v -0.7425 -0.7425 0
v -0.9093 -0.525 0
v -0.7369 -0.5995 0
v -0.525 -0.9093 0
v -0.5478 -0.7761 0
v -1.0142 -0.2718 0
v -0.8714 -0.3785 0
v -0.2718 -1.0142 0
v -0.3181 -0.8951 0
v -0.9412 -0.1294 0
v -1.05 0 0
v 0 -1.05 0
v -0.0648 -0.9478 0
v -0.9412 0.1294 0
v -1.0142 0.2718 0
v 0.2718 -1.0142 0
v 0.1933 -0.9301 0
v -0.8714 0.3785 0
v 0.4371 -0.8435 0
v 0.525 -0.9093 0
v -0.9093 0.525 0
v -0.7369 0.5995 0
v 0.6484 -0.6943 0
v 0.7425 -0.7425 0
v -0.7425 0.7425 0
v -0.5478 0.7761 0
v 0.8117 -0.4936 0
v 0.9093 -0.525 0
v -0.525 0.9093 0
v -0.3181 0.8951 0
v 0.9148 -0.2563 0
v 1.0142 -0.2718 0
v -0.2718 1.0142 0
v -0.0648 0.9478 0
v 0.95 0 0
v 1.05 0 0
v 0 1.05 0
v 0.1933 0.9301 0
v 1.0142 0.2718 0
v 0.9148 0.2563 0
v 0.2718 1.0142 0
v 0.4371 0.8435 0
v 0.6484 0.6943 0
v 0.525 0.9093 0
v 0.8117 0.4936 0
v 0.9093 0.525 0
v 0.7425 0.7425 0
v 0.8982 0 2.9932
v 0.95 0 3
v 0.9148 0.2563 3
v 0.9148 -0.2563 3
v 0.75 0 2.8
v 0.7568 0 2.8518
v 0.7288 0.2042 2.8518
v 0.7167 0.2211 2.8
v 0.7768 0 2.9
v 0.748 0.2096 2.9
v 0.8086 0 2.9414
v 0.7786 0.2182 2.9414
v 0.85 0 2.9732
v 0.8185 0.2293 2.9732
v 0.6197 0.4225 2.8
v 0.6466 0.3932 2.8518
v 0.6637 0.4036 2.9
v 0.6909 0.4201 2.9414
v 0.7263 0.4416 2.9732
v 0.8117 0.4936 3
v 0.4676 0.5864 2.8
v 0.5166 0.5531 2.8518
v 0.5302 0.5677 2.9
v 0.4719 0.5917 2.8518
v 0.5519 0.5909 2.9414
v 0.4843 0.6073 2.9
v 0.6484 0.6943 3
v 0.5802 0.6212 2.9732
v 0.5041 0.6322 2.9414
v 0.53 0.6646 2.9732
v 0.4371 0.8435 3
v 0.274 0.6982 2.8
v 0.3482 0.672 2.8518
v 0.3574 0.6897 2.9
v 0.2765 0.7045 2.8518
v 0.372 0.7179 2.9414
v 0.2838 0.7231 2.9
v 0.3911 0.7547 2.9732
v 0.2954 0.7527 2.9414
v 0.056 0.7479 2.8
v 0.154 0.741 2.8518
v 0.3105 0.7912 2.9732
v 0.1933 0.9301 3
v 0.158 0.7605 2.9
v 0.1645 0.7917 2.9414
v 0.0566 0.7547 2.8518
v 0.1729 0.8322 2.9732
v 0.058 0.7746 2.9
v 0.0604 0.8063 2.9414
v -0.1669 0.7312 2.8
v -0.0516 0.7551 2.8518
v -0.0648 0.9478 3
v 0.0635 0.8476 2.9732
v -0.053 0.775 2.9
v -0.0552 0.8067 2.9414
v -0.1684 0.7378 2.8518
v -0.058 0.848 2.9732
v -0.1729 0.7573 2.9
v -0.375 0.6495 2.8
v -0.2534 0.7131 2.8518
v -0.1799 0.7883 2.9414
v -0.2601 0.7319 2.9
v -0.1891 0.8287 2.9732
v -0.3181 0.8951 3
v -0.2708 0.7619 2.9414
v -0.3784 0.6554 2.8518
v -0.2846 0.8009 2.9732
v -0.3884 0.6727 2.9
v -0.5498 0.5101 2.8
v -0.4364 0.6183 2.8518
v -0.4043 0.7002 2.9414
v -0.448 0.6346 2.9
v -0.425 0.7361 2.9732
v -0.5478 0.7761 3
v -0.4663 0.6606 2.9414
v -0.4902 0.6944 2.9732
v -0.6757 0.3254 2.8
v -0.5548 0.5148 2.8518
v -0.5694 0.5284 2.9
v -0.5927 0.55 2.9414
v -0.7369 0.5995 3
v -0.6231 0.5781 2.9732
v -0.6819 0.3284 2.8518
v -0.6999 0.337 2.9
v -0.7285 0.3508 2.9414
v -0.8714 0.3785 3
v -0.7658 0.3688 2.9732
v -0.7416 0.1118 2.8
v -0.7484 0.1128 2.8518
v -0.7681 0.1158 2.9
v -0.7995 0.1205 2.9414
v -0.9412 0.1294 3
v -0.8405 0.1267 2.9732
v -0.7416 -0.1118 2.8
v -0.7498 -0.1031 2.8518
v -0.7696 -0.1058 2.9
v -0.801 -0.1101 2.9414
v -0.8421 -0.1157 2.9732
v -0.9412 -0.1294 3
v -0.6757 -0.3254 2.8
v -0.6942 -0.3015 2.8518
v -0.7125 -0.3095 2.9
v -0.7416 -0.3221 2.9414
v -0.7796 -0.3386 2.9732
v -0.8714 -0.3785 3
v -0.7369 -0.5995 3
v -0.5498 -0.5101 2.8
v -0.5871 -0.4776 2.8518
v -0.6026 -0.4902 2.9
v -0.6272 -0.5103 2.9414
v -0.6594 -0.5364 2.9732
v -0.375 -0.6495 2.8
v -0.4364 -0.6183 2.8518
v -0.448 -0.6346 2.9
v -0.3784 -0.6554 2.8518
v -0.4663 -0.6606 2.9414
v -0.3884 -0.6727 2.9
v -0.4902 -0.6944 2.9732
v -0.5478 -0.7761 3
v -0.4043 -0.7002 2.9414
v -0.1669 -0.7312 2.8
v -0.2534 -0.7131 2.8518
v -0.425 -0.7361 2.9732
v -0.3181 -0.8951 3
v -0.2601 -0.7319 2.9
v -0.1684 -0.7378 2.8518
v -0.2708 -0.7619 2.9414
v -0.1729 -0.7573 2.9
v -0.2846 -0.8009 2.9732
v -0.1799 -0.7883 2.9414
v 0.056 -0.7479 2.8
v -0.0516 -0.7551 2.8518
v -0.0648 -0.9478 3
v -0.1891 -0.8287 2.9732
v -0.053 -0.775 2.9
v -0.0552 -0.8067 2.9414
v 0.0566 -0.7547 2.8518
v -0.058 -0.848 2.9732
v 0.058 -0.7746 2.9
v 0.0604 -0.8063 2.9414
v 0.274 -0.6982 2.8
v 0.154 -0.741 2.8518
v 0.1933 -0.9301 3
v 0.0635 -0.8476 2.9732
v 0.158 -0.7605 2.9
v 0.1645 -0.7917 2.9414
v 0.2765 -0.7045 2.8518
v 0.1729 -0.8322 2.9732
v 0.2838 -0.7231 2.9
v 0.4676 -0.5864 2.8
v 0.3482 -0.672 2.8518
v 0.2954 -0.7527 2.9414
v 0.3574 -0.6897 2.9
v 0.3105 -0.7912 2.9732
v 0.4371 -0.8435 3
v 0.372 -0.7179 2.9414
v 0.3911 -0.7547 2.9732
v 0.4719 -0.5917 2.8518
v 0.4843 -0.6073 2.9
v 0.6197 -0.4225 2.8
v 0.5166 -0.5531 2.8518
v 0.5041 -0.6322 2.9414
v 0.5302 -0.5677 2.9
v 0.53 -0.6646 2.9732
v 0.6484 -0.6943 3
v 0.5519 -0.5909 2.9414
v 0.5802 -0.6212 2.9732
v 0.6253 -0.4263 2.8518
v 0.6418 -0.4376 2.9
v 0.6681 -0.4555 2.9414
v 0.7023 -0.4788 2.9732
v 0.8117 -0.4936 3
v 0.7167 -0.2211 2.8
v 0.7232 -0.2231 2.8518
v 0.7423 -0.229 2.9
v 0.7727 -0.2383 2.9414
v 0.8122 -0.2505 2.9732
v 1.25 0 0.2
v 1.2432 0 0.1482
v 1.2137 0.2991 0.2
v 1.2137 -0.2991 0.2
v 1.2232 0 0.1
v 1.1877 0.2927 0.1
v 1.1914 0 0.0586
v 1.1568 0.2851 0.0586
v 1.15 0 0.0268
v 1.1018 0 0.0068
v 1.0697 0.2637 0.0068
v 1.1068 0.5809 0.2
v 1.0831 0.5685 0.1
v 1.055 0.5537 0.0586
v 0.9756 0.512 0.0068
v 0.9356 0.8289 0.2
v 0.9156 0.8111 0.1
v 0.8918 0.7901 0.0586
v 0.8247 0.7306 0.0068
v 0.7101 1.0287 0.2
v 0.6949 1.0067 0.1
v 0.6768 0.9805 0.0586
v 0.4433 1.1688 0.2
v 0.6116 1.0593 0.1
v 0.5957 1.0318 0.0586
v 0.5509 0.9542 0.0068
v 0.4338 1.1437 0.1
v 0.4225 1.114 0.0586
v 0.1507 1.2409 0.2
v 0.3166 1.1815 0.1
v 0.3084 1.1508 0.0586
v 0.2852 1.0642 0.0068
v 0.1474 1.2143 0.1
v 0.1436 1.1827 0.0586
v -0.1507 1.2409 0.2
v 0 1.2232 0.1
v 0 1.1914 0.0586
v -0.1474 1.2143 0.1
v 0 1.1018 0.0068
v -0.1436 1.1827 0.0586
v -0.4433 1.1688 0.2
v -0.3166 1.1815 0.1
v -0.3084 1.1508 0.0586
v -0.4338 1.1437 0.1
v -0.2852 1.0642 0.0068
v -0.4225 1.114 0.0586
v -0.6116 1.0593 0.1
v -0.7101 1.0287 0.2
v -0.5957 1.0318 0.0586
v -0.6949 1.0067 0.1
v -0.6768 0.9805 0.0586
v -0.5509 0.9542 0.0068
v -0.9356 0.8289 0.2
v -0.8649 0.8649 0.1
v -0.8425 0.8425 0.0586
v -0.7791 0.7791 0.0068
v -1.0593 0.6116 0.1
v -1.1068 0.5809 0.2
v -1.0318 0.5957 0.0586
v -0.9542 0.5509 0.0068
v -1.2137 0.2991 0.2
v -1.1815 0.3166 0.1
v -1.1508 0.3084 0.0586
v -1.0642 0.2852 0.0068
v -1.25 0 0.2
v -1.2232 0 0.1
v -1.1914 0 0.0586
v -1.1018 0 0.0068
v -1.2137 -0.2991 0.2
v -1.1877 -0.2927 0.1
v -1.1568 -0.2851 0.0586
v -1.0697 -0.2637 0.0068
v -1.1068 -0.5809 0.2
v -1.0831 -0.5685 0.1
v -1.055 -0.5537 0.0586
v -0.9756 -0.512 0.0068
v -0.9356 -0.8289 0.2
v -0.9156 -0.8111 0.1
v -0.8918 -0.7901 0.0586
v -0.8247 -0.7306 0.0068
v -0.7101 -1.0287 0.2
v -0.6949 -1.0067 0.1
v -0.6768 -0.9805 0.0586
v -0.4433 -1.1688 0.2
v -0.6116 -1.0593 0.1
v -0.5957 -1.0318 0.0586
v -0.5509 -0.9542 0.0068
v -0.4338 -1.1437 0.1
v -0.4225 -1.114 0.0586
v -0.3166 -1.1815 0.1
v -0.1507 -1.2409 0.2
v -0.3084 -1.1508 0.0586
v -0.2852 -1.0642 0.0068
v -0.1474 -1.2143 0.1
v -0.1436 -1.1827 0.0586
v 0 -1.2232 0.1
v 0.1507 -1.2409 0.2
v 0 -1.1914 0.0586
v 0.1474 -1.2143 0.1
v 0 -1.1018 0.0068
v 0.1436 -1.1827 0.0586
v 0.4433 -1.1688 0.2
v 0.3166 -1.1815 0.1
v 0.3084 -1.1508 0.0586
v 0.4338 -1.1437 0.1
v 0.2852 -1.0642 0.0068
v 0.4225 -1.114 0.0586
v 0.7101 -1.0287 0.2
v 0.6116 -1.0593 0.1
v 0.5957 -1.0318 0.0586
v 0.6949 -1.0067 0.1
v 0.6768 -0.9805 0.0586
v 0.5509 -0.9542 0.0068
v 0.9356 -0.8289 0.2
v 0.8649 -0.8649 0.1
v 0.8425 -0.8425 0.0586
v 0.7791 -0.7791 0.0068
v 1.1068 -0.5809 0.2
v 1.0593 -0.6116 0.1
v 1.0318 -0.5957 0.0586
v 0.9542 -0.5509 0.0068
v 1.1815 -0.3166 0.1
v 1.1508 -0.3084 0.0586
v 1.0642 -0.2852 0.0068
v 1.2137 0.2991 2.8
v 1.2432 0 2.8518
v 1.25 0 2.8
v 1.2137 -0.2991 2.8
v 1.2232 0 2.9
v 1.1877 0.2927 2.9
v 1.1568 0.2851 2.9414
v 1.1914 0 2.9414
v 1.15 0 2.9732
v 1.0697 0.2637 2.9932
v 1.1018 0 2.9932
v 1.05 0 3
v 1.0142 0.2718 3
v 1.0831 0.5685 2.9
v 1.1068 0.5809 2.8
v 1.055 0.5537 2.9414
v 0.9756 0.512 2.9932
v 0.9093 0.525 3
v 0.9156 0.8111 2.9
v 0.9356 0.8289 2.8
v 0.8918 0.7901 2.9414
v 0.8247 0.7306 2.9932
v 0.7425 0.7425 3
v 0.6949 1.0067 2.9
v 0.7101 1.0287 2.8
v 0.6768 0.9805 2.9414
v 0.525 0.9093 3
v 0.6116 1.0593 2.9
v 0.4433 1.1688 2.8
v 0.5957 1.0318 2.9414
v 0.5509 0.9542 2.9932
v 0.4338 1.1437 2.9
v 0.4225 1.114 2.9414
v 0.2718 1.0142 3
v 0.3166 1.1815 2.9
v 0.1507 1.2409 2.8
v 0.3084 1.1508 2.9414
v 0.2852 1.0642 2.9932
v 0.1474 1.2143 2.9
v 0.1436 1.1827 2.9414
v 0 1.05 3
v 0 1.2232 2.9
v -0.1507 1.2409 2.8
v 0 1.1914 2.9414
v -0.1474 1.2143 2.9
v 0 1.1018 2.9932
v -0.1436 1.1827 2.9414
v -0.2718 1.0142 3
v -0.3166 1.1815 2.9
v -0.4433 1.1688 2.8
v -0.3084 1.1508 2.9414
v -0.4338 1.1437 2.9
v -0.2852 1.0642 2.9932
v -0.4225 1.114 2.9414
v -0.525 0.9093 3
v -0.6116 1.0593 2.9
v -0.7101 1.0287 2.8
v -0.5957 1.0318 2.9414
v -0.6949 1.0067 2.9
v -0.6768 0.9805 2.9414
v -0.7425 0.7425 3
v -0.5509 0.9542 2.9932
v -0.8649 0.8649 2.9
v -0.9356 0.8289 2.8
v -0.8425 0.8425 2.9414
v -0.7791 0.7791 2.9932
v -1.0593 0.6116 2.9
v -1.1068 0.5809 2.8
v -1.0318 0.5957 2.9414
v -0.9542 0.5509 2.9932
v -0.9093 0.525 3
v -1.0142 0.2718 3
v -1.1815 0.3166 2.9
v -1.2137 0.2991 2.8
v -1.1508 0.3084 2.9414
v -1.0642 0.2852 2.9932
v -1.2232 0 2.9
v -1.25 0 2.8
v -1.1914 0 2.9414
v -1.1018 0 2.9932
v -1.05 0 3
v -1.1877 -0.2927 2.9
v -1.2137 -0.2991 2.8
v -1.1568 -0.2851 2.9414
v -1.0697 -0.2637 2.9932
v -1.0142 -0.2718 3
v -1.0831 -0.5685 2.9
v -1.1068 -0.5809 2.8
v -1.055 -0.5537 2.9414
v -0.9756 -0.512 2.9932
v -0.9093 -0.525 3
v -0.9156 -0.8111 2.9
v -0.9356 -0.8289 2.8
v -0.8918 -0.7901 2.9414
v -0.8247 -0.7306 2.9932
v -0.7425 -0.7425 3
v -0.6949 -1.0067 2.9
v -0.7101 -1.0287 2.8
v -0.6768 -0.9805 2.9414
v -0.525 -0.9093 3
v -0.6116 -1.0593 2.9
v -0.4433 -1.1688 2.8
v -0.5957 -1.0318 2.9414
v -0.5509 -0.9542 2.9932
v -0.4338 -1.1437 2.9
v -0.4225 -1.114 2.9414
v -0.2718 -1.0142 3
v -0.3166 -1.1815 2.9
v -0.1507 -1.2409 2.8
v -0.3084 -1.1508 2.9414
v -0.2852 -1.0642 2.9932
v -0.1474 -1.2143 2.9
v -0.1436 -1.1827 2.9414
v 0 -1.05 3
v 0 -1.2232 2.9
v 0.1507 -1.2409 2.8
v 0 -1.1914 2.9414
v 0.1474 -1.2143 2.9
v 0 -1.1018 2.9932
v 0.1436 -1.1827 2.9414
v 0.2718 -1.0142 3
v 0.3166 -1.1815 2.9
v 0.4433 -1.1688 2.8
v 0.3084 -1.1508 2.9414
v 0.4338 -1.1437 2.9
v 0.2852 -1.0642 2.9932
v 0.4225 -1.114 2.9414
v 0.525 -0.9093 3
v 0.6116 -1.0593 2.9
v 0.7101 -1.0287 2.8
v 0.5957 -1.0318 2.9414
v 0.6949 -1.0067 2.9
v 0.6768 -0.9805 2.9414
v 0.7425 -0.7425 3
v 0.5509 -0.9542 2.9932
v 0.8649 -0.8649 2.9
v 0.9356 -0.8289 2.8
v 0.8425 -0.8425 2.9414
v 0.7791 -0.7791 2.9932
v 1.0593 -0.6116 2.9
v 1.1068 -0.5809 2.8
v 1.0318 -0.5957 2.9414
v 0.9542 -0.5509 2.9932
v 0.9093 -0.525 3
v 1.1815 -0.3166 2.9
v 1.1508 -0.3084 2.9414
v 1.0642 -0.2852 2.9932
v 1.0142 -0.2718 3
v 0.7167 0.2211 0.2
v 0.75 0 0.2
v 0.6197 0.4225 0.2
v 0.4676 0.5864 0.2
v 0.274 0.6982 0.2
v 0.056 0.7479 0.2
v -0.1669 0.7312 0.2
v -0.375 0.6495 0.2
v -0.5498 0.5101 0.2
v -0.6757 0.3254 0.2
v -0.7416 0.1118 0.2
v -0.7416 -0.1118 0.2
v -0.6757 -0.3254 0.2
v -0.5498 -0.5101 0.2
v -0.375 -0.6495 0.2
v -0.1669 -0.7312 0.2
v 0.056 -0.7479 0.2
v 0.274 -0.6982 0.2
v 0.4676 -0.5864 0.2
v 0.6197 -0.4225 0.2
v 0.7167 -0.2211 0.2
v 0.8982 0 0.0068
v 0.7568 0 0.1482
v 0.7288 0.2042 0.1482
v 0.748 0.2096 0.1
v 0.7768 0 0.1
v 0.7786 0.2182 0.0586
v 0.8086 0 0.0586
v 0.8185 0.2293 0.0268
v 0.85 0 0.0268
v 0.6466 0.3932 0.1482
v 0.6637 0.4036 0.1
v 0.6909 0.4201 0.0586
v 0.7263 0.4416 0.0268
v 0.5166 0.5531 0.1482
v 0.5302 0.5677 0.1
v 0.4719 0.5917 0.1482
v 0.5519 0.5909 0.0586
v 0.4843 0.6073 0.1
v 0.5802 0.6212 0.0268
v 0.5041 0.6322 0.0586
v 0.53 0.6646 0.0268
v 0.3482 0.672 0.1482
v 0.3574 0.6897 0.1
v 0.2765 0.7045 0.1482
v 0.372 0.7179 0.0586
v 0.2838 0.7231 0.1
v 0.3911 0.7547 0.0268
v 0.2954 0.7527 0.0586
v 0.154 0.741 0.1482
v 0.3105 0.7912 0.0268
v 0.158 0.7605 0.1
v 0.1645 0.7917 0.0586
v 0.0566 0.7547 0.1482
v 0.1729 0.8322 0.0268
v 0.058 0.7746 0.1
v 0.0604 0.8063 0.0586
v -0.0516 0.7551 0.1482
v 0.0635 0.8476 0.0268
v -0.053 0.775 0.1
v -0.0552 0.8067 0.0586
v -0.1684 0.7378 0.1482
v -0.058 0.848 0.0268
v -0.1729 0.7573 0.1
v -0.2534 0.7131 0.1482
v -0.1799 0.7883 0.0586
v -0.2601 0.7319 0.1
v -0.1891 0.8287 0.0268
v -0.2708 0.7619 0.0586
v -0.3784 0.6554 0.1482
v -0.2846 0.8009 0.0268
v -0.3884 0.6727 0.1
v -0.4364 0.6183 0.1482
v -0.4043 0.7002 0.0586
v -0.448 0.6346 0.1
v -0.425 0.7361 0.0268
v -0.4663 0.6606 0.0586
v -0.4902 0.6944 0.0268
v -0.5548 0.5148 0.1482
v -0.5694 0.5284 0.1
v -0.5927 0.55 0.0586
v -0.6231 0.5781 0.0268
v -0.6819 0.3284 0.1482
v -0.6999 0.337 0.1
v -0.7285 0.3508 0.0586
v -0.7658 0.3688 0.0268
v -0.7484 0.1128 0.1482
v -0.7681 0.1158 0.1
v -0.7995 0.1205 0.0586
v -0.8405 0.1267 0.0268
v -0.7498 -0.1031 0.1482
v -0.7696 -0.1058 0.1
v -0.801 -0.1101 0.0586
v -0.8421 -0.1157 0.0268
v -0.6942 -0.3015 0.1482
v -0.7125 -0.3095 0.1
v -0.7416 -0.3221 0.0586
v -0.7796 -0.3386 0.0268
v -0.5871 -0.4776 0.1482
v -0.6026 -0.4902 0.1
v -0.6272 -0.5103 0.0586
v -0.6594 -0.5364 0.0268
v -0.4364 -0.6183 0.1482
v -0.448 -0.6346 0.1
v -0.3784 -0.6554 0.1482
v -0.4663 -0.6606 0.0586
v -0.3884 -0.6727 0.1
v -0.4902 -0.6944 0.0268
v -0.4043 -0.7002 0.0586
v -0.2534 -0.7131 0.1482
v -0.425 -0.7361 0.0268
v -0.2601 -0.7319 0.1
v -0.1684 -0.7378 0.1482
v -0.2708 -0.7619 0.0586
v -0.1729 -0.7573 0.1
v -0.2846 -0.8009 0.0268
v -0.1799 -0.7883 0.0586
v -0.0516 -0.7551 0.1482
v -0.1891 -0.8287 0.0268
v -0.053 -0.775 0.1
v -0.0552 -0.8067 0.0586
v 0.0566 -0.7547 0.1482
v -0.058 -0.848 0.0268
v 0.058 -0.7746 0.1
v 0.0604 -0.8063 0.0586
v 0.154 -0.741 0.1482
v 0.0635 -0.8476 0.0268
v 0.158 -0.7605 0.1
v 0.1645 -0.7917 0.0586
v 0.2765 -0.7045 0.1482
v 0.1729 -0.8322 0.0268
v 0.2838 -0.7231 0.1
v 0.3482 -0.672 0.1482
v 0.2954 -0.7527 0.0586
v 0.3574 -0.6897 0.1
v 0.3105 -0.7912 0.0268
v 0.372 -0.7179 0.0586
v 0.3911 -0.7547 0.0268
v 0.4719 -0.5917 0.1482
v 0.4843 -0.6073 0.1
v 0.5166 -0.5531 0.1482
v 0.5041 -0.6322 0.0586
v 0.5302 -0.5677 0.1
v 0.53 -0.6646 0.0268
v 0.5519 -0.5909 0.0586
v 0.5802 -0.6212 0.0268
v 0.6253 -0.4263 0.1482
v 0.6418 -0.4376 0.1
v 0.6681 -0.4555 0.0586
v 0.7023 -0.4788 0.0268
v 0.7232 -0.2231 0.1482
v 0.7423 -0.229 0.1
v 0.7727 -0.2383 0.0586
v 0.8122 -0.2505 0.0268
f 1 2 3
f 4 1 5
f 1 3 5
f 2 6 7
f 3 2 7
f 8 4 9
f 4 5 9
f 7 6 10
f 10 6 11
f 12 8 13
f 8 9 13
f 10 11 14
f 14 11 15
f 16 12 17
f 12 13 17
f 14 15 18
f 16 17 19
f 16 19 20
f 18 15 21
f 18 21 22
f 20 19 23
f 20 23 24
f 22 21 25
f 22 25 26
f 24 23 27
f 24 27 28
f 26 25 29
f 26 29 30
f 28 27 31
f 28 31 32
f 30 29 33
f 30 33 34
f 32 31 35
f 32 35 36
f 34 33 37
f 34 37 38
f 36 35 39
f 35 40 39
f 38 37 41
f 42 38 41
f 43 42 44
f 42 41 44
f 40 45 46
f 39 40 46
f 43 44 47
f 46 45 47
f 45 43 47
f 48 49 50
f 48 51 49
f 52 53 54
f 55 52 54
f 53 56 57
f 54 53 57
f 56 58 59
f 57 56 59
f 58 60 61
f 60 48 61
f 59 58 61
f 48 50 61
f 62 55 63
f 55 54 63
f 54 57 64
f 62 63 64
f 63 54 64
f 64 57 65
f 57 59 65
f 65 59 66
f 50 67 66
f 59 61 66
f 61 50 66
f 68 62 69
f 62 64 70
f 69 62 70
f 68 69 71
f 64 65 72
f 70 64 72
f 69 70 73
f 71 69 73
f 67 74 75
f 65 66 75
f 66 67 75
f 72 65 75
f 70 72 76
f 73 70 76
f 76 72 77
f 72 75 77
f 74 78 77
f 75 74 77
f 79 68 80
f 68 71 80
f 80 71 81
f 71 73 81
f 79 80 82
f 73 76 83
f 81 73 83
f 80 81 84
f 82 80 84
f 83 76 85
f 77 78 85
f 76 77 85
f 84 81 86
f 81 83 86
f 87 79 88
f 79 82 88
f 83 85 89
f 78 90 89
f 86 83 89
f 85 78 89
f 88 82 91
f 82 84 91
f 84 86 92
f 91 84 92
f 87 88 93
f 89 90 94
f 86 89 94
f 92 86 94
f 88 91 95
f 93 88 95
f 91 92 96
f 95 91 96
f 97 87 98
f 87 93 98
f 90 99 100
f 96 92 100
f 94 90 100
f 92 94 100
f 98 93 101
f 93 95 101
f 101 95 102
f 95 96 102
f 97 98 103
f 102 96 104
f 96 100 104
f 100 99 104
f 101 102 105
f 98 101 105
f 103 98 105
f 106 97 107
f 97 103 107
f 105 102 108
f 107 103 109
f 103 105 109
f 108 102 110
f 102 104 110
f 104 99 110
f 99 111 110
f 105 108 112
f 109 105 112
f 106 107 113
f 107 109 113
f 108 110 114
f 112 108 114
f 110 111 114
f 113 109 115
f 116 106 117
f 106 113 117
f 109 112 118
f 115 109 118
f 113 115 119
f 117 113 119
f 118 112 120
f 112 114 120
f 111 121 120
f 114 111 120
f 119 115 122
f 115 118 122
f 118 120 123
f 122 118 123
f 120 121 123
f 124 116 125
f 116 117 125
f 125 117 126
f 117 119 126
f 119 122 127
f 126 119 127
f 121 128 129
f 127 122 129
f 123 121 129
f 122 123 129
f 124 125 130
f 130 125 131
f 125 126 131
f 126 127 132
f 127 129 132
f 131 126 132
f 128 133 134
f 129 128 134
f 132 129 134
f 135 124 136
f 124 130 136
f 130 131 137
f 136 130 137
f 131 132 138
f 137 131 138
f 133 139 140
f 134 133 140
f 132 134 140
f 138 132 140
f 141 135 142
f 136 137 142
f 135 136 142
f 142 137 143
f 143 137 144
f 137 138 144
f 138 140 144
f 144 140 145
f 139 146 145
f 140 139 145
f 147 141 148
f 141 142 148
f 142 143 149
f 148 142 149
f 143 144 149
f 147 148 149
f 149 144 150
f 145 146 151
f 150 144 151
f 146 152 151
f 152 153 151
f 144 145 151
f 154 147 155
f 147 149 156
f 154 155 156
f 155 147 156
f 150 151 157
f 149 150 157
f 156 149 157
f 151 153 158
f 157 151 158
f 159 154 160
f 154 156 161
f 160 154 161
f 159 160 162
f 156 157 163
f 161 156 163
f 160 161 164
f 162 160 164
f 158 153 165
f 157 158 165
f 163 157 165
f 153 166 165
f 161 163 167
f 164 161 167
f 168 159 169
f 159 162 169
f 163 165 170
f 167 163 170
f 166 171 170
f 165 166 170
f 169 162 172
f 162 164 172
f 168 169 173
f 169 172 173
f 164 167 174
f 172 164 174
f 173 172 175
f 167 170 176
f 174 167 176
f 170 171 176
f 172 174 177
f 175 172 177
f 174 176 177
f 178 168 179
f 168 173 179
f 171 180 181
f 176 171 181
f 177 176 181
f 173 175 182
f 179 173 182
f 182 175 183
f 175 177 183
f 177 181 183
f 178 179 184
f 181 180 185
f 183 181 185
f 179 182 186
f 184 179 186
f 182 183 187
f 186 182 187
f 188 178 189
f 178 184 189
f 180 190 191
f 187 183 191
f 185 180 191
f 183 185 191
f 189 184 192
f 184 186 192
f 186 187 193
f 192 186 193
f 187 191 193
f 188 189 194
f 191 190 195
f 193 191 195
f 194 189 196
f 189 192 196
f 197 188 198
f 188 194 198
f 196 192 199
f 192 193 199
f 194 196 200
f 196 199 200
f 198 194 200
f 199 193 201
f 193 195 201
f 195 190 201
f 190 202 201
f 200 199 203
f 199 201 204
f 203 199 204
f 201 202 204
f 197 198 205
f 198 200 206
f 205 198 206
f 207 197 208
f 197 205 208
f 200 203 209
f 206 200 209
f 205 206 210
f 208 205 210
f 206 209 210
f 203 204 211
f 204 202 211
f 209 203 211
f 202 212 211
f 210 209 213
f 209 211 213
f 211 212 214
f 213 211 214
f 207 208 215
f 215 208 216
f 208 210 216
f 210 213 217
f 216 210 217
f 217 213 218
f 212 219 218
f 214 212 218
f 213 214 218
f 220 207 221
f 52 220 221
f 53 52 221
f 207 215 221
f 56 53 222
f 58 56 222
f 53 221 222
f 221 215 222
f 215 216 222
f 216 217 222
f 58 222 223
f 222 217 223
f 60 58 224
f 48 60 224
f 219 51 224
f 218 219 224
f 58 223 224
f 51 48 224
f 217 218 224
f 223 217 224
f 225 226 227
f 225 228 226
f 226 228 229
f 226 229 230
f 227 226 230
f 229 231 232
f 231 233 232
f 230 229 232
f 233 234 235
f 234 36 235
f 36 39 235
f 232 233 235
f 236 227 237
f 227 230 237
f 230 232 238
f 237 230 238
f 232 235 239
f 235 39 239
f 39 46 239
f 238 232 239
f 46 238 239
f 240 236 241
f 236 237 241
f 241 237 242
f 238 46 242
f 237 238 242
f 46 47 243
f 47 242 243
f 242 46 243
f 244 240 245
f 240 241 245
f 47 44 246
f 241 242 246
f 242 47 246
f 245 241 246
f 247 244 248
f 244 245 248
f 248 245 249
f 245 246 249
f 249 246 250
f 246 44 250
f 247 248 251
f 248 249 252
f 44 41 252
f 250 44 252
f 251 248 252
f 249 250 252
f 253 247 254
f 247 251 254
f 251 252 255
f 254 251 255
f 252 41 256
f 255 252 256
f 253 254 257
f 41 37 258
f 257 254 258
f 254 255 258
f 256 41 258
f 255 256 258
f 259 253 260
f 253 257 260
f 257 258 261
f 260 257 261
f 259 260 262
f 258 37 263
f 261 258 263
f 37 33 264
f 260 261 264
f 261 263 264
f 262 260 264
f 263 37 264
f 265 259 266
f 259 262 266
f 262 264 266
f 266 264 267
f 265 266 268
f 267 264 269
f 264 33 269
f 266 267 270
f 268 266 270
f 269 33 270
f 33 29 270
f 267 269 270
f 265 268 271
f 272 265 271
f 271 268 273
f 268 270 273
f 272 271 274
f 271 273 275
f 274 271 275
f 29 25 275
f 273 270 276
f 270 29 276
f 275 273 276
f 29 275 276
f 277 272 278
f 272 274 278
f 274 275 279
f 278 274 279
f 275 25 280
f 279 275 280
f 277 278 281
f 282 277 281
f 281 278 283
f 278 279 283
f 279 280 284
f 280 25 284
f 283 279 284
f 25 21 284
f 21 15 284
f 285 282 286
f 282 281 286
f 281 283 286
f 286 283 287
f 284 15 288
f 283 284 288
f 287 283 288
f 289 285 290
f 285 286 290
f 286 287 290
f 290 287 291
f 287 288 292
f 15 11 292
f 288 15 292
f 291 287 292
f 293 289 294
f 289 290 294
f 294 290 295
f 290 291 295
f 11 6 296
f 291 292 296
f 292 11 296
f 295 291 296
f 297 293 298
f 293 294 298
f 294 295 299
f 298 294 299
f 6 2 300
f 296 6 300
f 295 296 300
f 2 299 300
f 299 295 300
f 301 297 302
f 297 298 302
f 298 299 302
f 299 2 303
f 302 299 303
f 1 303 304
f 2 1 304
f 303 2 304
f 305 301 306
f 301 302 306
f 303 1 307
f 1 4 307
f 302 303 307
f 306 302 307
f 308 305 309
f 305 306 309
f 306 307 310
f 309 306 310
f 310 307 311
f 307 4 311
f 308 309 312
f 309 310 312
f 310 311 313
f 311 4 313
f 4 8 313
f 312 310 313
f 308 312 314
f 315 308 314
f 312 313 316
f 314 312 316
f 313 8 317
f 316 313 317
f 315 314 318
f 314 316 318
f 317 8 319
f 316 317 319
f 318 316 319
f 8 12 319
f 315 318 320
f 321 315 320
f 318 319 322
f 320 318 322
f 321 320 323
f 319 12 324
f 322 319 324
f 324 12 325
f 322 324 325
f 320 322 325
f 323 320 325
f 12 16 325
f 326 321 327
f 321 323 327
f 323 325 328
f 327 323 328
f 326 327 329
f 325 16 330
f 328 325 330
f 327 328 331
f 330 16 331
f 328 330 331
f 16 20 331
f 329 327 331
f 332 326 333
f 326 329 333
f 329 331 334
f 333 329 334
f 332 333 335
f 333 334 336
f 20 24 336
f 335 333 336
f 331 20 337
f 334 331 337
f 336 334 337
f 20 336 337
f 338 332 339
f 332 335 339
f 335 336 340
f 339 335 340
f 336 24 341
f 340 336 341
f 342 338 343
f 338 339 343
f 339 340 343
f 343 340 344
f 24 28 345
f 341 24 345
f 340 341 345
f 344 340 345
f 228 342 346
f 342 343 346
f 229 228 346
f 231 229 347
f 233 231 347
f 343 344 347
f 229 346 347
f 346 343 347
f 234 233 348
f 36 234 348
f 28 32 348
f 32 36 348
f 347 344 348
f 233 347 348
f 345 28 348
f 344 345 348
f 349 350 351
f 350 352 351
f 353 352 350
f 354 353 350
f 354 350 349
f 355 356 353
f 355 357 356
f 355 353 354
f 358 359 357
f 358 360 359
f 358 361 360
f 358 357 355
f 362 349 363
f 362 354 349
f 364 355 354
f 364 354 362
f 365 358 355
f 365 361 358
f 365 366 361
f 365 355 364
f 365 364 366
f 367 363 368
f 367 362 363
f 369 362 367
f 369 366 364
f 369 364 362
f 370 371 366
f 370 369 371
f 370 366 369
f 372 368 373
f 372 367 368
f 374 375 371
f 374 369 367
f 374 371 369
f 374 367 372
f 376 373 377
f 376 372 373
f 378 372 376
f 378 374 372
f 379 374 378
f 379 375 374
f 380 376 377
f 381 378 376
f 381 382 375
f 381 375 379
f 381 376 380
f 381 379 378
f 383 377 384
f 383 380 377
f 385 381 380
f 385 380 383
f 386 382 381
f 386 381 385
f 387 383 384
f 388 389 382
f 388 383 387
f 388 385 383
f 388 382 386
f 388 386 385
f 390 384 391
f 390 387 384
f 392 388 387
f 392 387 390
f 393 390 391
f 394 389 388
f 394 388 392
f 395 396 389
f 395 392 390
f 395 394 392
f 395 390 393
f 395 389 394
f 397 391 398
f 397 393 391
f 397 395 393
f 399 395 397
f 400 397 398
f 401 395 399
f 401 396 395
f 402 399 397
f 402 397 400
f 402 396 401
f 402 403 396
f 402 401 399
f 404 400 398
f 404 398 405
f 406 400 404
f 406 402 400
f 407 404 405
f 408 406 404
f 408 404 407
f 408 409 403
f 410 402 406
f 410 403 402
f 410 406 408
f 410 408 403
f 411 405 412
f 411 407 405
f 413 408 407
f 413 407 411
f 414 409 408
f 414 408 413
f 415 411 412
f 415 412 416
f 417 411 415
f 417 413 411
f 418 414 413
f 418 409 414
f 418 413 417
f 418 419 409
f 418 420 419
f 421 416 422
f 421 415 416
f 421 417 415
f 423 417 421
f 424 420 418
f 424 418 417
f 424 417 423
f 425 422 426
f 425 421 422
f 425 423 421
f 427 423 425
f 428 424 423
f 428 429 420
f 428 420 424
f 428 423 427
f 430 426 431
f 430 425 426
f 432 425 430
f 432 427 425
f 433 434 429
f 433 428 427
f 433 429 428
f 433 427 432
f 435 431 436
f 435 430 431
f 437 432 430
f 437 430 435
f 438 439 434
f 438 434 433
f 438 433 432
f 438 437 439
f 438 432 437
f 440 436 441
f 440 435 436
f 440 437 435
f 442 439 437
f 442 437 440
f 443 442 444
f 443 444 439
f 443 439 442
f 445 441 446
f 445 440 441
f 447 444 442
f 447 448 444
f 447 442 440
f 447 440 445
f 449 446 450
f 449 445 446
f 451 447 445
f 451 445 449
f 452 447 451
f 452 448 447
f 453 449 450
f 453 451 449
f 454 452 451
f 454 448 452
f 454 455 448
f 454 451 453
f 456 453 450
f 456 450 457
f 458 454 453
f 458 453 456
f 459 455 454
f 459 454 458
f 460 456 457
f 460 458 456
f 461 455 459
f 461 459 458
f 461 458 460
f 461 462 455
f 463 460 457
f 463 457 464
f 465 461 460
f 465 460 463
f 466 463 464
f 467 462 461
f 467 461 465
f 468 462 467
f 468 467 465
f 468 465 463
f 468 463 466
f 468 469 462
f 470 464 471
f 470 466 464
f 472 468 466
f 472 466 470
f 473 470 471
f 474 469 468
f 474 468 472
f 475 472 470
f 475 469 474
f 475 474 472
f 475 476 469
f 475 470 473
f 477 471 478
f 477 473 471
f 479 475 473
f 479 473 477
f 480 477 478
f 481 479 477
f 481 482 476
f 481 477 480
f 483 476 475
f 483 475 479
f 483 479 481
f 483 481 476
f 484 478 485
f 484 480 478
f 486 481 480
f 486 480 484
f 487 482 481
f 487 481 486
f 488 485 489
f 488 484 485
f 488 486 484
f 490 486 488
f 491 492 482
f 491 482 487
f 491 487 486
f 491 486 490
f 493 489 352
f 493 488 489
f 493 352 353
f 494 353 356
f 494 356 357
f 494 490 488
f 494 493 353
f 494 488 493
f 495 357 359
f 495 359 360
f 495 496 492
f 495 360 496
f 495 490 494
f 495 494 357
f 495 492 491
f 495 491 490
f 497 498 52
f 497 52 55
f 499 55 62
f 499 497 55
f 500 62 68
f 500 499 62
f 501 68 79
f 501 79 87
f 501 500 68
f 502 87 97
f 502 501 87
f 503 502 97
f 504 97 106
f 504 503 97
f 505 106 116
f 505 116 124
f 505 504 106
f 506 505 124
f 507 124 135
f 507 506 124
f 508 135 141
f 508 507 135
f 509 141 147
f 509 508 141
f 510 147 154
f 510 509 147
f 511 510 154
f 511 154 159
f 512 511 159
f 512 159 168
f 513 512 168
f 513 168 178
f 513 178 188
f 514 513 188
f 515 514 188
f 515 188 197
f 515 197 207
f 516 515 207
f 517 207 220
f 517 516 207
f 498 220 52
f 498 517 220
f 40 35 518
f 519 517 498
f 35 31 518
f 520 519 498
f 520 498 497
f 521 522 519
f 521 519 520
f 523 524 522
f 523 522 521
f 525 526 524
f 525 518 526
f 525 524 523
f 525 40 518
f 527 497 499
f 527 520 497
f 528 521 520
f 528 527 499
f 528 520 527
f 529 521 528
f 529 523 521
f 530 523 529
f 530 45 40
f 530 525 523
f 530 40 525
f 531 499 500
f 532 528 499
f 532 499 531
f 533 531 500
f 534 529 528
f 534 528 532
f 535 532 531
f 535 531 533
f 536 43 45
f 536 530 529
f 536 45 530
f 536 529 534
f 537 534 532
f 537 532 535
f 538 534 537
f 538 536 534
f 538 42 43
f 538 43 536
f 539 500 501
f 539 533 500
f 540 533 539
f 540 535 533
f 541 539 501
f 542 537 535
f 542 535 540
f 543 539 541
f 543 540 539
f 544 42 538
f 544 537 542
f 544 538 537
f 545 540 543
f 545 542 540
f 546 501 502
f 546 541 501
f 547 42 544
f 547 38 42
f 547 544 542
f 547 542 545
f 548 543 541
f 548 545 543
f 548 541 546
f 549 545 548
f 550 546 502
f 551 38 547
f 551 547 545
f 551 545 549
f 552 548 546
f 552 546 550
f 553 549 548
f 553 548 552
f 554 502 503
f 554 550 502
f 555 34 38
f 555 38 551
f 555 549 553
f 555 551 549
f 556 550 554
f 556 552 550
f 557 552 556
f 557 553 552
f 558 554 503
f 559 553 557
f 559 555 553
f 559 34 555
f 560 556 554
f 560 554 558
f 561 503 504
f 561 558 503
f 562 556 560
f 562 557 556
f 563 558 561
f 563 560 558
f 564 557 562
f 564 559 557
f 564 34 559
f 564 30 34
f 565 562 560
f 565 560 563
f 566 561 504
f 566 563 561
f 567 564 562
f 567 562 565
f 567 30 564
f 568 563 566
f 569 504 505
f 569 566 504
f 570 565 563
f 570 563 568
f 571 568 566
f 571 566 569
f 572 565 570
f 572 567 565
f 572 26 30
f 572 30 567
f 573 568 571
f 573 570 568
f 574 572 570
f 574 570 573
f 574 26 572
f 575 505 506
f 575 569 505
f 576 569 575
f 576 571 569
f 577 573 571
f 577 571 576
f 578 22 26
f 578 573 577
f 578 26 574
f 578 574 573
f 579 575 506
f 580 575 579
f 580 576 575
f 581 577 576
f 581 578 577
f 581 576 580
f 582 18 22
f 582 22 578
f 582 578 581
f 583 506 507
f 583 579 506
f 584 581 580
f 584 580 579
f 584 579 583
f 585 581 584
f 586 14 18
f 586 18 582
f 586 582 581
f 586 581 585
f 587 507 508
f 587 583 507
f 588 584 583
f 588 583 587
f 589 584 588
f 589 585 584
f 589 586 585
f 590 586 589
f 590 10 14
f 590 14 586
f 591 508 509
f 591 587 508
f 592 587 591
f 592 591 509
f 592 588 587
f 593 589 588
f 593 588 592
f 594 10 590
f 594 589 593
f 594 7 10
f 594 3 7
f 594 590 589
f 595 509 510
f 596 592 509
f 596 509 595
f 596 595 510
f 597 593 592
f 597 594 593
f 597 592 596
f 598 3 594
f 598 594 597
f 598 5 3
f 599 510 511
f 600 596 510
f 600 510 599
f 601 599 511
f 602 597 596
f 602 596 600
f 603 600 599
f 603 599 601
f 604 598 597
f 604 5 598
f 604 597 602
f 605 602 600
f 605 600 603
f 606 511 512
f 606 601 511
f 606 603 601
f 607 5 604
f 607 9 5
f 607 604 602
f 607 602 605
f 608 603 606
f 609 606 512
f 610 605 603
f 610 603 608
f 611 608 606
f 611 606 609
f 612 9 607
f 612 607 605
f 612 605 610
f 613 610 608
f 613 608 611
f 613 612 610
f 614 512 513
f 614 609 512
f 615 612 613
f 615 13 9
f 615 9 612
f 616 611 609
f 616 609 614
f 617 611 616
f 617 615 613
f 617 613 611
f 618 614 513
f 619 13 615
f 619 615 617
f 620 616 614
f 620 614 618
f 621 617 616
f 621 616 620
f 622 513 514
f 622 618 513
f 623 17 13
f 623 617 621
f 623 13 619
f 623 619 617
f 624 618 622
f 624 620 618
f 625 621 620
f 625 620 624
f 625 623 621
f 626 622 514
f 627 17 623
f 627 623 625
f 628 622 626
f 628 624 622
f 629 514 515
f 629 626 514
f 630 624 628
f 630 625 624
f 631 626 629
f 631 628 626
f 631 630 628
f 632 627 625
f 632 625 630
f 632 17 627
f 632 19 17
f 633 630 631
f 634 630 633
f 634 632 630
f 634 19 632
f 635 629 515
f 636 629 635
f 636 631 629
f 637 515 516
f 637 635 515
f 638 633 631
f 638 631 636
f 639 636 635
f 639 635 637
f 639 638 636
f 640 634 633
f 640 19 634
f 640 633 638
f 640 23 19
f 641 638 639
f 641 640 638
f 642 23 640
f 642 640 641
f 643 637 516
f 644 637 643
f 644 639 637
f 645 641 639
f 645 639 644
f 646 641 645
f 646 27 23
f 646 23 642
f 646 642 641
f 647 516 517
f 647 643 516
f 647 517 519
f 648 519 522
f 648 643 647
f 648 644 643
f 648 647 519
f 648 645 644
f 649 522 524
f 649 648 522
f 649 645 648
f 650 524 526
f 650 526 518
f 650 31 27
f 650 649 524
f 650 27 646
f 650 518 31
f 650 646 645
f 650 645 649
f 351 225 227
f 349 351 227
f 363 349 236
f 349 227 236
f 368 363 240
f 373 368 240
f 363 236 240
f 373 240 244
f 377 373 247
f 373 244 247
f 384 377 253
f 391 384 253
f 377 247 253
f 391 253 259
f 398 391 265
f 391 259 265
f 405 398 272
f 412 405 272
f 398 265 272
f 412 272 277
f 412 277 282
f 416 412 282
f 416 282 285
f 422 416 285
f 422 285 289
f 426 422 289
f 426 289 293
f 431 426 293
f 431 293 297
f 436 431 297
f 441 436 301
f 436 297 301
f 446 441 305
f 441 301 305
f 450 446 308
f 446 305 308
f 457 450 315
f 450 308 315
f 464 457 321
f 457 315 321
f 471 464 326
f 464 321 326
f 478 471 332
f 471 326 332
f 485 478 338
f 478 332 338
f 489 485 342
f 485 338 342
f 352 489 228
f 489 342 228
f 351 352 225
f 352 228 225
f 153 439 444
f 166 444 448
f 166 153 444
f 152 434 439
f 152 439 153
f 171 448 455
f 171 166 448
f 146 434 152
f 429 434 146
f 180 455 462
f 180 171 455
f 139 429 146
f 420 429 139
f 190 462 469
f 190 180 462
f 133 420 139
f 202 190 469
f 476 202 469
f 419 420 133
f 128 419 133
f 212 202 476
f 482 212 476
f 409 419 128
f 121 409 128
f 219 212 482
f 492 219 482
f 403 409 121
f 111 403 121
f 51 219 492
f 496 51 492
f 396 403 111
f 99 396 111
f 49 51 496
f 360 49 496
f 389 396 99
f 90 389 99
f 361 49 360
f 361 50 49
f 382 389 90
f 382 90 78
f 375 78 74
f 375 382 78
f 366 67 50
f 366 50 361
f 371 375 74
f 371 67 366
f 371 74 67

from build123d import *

# Parameters (mm, degrees)
SKETCH_R   = 1.25
SKETCH_R_2 = 0.75
PAD_DEPTH  = 3
FILLET_R   = 0.2


with BuildPart() as part:
    # Sketch → Pad (new body)
    with BuildSketch(Plane.XY):
        Circle(SKETCH_R)
        Circle(SKETCH_R_2, mode=Mode.SUBTRACT)
    extrude(amount=PAD_DEPTH)

    # Fillet
    fillet_edges = [part.edges().sort_by_distance(p)[0] for p in [
        (1.25, 0, 1.5),
        (-1.25, 0, 0),
        (-1.25, 0, 3),
        (0.75, 0, 1.5),
        (-0.75, 0, 0),
        (-0.75, 0, 3),
    ]]
    fillet(fillet_edges, radius=FILLET_R)


solid = part.part
